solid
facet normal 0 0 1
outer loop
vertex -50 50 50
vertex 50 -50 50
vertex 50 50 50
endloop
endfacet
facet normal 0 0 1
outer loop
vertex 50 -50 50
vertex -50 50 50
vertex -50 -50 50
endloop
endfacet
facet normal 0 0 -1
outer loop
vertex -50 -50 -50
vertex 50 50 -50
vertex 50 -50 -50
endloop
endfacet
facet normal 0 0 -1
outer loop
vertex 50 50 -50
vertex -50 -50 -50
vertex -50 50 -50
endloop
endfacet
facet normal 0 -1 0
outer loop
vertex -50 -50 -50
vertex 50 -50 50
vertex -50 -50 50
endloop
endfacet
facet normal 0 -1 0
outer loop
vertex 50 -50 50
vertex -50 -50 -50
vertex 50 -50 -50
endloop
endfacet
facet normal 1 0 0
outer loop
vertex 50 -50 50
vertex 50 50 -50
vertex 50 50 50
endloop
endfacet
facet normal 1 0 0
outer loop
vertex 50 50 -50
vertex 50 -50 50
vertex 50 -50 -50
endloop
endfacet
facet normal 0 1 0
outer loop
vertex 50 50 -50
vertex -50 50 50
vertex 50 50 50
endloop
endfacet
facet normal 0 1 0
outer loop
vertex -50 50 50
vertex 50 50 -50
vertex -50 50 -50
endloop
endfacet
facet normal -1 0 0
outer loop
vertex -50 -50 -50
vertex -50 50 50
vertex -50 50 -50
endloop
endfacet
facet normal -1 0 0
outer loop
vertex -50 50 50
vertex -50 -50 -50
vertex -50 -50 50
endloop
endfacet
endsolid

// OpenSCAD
// Category-colored placeholder box for any catalog entry without a
// dedicated template. Better than a missing mesh in the viewport.

dim_l_mm = 100;
dim_d_mm = 100;
dim_h_mm = 100;

cube(size = [dim_l_mm, dim_d_mm, dim_h_mm], center = true);
